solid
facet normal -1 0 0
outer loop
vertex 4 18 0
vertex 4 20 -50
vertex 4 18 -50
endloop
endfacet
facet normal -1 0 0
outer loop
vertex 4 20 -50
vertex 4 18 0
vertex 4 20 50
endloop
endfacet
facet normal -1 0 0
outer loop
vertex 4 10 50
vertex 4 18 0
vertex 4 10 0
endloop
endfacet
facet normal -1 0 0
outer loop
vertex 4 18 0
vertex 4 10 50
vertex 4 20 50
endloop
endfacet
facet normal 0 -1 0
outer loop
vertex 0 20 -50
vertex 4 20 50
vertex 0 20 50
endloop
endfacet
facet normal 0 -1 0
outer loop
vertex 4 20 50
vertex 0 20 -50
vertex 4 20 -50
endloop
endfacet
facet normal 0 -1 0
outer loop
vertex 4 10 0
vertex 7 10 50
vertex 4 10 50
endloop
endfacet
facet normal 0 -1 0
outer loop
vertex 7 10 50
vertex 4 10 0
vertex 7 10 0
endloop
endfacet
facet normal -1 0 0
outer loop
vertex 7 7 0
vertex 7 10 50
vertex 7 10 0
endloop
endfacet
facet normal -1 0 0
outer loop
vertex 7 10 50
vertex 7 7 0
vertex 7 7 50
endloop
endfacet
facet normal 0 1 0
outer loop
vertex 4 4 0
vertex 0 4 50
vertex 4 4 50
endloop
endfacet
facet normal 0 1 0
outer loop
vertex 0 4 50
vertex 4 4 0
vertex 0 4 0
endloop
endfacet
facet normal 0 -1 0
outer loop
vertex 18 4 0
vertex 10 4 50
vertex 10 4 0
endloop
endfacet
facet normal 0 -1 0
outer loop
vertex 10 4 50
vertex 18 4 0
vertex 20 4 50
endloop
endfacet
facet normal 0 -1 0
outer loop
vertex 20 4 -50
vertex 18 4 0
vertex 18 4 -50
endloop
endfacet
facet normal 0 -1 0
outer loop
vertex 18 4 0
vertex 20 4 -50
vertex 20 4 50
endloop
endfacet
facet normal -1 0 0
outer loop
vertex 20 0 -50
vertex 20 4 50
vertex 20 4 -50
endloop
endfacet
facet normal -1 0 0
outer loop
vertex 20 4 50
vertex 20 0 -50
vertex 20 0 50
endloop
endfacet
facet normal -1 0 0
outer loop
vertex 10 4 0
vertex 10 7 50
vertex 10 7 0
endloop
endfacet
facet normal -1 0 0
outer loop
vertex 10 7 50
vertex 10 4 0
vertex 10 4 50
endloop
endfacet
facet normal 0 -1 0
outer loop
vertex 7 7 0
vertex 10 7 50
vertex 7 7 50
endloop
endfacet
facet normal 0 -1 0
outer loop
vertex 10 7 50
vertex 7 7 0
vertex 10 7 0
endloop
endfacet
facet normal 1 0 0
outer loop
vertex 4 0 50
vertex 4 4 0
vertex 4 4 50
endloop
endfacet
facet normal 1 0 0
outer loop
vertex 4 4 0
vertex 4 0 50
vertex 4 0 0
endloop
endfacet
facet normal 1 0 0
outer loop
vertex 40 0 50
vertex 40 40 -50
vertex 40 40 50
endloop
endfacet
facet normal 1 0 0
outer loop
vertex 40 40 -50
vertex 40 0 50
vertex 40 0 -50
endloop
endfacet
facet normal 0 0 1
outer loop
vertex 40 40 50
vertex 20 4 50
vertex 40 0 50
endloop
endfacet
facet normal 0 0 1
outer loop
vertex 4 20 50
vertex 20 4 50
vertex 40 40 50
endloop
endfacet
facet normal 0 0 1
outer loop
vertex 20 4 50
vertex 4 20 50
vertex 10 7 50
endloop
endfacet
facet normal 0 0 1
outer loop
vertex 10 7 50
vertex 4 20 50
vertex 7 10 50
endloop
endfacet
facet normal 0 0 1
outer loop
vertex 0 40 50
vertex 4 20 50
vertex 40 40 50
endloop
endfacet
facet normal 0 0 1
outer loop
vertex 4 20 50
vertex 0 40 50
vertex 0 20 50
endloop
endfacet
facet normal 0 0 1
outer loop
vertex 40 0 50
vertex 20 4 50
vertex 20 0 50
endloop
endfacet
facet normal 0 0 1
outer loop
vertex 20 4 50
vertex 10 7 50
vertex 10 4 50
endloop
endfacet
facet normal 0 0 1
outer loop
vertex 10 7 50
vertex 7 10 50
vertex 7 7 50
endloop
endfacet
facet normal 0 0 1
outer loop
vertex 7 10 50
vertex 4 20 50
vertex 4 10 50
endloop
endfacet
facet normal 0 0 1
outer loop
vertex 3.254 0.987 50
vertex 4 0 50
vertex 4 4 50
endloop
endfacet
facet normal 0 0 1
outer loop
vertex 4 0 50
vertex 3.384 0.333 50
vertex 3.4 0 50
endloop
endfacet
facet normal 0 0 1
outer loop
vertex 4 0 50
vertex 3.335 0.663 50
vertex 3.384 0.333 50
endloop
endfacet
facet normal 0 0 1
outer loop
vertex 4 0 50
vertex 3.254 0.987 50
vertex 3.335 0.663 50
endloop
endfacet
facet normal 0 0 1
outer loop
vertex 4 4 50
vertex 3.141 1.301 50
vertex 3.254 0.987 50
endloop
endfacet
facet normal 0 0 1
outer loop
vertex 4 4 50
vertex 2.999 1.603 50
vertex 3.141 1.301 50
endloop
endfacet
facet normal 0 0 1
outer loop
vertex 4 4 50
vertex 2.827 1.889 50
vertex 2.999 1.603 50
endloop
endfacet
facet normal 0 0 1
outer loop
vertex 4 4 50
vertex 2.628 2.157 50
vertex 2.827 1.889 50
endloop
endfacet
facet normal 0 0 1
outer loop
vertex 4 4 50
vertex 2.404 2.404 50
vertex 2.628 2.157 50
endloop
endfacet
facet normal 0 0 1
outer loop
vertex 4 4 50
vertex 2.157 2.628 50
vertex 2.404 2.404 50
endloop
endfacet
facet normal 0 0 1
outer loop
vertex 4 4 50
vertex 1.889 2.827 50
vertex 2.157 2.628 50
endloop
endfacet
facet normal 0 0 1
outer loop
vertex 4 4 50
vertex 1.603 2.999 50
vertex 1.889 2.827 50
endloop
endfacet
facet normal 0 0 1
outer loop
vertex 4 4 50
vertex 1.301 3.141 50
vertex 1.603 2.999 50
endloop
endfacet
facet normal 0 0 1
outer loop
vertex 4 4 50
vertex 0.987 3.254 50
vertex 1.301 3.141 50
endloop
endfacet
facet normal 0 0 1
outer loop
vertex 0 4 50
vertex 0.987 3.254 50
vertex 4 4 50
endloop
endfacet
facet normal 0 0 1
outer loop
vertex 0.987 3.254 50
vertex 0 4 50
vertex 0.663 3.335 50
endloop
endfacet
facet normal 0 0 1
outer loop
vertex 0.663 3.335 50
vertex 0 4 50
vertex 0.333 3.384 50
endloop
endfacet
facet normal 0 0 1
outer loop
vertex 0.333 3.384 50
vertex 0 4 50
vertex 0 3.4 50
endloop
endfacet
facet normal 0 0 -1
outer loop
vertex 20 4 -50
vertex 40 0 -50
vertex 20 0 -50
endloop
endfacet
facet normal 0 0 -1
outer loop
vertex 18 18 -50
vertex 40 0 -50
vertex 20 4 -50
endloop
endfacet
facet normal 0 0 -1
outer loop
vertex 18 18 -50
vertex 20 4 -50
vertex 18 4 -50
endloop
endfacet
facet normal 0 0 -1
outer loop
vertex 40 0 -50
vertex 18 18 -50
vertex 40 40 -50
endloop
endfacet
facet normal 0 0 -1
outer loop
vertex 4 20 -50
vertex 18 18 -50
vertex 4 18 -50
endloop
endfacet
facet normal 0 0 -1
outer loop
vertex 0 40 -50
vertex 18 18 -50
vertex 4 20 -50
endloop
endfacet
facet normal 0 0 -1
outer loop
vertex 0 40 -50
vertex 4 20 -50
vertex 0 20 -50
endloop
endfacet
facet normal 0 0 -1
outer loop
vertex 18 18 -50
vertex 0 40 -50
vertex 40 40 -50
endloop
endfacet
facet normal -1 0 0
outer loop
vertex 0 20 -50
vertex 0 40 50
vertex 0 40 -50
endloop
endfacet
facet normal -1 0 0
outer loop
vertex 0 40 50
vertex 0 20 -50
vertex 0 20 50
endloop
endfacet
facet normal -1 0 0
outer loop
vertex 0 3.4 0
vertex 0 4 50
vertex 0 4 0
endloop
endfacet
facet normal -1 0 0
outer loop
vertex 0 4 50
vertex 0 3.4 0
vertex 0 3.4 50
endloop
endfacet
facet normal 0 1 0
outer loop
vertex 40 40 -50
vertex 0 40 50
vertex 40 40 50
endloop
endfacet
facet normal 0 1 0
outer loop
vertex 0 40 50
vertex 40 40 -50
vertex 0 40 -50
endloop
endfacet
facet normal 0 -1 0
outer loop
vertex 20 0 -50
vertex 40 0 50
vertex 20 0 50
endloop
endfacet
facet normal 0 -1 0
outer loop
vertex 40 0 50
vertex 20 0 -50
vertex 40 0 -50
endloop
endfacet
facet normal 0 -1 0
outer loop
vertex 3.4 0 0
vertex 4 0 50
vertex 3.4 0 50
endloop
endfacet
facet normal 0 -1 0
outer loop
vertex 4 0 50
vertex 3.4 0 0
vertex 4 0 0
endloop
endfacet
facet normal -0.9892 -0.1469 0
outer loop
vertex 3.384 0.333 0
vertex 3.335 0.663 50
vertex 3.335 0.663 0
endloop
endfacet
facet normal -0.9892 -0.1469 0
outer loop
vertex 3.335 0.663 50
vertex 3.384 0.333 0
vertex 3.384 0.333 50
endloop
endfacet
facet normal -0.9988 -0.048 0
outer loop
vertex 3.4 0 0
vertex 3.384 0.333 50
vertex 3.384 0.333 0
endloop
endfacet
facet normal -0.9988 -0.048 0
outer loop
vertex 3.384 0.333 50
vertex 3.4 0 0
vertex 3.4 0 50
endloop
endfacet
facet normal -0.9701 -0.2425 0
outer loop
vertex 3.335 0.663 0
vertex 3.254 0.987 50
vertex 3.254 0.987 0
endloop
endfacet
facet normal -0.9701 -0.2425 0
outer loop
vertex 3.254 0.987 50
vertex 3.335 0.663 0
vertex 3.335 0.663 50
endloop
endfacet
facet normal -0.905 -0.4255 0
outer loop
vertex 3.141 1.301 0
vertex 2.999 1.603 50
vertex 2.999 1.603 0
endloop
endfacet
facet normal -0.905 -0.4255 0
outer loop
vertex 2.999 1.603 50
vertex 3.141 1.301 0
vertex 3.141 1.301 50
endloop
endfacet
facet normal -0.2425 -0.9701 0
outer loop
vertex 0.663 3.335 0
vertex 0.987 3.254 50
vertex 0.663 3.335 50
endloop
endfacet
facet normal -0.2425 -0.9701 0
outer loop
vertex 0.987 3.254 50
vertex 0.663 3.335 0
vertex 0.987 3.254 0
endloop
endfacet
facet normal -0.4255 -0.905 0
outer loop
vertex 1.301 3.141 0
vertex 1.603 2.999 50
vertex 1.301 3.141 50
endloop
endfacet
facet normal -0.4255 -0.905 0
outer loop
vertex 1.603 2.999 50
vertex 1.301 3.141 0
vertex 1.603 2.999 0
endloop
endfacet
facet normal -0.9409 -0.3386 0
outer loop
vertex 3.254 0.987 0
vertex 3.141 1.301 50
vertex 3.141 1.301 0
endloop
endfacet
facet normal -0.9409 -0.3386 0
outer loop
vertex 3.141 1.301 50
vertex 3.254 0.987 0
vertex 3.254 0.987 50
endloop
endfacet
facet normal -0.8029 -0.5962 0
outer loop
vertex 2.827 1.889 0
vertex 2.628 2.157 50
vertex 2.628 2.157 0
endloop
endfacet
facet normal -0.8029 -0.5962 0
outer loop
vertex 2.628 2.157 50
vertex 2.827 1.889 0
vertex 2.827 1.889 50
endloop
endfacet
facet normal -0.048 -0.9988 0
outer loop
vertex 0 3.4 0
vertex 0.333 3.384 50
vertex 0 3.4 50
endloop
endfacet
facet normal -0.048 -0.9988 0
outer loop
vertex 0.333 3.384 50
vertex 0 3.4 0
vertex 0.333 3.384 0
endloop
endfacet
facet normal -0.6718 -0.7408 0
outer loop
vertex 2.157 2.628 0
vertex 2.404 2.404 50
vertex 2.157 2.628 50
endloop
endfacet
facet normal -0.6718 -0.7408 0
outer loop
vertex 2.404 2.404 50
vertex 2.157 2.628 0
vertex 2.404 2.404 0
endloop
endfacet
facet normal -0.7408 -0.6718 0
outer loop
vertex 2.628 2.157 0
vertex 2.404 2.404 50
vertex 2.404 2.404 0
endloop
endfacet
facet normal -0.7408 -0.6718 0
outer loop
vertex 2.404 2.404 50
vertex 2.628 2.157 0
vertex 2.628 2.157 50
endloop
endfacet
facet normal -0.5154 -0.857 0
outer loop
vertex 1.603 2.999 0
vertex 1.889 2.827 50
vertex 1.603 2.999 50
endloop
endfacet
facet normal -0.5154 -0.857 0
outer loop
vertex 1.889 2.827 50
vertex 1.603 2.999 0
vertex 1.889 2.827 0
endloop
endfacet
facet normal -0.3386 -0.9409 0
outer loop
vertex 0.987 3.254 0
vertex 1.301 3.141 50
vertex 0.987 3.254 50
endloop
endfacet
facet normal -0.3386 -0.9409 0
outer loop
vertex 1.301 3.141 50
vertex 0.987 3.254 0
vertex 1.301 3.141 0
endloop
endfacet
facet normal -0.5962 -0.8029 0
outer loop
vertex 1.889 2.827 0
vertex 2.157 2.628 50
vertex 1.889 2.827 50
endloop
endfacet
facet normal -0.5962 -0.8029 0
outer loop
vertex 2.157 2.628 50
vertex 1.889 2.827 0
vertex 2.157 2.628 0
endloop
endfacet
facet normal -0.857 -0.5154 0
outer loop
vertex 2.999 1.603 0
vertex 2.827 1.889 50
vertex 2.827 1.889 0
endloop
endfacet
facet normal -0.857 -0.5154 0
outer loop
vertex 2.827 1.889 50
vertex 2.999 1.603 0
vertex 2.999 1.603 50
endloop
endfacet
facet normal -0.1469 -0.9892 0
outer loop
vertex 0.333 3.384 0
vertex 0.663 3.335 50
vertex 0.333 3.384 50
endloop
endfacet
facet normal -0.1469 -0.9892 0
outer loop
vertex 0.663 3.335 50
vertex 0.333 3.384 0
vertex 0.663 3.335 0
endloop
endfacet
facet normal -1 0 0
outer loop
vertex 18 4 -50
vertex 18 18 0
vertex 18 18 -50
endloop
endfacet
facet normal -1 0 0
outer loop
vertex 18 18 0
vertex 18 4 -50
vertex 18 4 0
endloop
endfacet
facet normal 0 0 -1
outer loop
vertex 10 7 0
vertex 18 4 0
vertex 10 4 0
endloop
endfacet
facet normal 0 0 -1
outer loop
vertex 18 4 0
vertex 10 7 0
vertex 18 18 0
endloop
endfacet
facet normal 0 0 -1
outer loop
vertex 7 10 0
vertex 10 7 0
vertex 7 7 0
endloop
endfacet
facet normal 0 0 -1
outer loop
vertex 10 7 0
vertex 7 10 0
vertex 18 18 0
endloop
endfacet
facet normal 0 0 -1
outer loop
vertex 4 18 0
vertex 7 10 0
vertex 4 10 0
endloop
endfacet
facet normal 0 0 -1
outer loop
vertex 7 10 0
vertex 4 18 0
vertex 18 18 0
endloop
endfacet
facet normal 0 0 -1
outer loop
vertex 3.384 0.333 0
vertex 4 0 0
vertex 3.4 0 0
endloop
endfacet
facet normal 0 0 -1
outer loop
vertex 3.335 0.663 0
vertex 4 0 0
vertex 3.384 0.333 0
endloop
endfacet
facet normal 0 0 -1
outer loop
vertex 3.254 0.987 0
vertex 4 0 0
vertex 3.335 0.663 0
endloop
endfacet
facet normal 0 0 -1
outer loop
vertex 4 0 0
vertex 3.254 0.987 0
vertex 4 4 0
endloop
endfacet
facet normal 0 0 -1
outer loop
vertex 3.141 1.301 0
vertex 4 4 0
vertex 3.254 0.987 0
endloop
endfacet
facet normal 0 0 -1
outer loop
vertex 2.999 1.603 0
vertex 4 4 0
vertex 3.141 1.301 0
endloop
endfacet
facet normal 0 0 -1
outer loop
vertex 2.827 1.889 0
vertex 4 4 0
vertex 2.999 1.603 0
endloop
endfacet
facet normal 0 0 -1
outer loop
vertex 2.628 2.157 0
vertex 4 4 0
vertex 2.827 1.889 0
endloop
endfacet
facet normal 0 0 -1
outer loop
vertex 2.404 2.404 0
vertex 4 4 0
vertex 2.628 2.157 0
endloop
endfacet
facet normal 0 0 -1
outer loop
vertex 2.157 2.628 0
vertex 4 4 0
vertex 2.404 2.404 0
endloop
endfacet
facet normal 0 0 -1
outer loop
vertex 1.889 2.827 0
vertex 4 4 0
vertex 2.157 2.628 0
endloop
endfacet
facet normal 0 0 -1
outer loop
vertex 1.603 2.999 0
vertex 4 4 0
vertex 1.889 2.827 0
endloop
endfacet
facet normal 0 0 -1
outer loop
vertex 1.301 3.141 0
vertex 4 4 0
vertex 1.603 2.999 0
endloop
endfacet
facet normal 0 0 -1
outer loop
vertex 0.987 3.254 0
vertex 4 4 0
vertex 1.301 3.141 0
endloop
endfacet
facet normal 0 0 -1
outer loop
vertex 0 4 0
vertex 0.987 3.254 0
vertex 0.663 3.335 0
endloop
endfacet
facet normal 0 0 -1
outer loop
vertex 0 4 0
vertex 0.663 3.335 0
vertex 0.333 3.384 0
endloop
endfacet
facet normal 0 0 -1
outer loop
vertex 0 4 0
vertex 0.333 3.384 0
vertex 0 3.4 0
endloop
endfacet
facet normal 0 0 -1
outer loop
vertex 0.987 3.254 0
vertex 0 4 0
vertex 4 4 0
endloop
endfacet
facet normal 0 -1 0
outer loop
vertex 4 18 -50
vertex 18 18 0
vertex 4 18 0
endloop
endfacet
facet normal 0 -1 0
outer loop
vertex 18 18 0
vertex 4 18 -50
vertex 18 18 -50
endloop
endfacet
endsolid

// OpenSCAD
$fn=64;

module extrusion_4040(length=100, size=40, wall=2.0, slot=8.0, slot_depth=10.0, center_hole_d=6.8) {
    difference() {
        translate([0,0,-length/2])
            cube([size,size,length], center=false);

        // Center hole
        cylinder(h=length+2, d=center_hole_d, center=true);

        // Inner lightening pocket
        translate([0,0,-length/2-1])
            cube([size-2*wall, size-2*wall, length+2], center=true);

        // T-slots on 4 sides (approximated)
        for (a=[0,90,180,270]) {
            rotate([0,0,a]) {
                // Slot opening
                translate([0, size/2 - slot_depth/2, 0])
                    cube([slot, slot_depth, length+2], center=true);

                // Slot cavity (wider inside)
                translate([0, size/2 - slot_depth - 6/2, 0])
                    cube([slot+6, 6, length+2], center=true);
            }
        }
    }
}

extrusion_4040(100, 40);
